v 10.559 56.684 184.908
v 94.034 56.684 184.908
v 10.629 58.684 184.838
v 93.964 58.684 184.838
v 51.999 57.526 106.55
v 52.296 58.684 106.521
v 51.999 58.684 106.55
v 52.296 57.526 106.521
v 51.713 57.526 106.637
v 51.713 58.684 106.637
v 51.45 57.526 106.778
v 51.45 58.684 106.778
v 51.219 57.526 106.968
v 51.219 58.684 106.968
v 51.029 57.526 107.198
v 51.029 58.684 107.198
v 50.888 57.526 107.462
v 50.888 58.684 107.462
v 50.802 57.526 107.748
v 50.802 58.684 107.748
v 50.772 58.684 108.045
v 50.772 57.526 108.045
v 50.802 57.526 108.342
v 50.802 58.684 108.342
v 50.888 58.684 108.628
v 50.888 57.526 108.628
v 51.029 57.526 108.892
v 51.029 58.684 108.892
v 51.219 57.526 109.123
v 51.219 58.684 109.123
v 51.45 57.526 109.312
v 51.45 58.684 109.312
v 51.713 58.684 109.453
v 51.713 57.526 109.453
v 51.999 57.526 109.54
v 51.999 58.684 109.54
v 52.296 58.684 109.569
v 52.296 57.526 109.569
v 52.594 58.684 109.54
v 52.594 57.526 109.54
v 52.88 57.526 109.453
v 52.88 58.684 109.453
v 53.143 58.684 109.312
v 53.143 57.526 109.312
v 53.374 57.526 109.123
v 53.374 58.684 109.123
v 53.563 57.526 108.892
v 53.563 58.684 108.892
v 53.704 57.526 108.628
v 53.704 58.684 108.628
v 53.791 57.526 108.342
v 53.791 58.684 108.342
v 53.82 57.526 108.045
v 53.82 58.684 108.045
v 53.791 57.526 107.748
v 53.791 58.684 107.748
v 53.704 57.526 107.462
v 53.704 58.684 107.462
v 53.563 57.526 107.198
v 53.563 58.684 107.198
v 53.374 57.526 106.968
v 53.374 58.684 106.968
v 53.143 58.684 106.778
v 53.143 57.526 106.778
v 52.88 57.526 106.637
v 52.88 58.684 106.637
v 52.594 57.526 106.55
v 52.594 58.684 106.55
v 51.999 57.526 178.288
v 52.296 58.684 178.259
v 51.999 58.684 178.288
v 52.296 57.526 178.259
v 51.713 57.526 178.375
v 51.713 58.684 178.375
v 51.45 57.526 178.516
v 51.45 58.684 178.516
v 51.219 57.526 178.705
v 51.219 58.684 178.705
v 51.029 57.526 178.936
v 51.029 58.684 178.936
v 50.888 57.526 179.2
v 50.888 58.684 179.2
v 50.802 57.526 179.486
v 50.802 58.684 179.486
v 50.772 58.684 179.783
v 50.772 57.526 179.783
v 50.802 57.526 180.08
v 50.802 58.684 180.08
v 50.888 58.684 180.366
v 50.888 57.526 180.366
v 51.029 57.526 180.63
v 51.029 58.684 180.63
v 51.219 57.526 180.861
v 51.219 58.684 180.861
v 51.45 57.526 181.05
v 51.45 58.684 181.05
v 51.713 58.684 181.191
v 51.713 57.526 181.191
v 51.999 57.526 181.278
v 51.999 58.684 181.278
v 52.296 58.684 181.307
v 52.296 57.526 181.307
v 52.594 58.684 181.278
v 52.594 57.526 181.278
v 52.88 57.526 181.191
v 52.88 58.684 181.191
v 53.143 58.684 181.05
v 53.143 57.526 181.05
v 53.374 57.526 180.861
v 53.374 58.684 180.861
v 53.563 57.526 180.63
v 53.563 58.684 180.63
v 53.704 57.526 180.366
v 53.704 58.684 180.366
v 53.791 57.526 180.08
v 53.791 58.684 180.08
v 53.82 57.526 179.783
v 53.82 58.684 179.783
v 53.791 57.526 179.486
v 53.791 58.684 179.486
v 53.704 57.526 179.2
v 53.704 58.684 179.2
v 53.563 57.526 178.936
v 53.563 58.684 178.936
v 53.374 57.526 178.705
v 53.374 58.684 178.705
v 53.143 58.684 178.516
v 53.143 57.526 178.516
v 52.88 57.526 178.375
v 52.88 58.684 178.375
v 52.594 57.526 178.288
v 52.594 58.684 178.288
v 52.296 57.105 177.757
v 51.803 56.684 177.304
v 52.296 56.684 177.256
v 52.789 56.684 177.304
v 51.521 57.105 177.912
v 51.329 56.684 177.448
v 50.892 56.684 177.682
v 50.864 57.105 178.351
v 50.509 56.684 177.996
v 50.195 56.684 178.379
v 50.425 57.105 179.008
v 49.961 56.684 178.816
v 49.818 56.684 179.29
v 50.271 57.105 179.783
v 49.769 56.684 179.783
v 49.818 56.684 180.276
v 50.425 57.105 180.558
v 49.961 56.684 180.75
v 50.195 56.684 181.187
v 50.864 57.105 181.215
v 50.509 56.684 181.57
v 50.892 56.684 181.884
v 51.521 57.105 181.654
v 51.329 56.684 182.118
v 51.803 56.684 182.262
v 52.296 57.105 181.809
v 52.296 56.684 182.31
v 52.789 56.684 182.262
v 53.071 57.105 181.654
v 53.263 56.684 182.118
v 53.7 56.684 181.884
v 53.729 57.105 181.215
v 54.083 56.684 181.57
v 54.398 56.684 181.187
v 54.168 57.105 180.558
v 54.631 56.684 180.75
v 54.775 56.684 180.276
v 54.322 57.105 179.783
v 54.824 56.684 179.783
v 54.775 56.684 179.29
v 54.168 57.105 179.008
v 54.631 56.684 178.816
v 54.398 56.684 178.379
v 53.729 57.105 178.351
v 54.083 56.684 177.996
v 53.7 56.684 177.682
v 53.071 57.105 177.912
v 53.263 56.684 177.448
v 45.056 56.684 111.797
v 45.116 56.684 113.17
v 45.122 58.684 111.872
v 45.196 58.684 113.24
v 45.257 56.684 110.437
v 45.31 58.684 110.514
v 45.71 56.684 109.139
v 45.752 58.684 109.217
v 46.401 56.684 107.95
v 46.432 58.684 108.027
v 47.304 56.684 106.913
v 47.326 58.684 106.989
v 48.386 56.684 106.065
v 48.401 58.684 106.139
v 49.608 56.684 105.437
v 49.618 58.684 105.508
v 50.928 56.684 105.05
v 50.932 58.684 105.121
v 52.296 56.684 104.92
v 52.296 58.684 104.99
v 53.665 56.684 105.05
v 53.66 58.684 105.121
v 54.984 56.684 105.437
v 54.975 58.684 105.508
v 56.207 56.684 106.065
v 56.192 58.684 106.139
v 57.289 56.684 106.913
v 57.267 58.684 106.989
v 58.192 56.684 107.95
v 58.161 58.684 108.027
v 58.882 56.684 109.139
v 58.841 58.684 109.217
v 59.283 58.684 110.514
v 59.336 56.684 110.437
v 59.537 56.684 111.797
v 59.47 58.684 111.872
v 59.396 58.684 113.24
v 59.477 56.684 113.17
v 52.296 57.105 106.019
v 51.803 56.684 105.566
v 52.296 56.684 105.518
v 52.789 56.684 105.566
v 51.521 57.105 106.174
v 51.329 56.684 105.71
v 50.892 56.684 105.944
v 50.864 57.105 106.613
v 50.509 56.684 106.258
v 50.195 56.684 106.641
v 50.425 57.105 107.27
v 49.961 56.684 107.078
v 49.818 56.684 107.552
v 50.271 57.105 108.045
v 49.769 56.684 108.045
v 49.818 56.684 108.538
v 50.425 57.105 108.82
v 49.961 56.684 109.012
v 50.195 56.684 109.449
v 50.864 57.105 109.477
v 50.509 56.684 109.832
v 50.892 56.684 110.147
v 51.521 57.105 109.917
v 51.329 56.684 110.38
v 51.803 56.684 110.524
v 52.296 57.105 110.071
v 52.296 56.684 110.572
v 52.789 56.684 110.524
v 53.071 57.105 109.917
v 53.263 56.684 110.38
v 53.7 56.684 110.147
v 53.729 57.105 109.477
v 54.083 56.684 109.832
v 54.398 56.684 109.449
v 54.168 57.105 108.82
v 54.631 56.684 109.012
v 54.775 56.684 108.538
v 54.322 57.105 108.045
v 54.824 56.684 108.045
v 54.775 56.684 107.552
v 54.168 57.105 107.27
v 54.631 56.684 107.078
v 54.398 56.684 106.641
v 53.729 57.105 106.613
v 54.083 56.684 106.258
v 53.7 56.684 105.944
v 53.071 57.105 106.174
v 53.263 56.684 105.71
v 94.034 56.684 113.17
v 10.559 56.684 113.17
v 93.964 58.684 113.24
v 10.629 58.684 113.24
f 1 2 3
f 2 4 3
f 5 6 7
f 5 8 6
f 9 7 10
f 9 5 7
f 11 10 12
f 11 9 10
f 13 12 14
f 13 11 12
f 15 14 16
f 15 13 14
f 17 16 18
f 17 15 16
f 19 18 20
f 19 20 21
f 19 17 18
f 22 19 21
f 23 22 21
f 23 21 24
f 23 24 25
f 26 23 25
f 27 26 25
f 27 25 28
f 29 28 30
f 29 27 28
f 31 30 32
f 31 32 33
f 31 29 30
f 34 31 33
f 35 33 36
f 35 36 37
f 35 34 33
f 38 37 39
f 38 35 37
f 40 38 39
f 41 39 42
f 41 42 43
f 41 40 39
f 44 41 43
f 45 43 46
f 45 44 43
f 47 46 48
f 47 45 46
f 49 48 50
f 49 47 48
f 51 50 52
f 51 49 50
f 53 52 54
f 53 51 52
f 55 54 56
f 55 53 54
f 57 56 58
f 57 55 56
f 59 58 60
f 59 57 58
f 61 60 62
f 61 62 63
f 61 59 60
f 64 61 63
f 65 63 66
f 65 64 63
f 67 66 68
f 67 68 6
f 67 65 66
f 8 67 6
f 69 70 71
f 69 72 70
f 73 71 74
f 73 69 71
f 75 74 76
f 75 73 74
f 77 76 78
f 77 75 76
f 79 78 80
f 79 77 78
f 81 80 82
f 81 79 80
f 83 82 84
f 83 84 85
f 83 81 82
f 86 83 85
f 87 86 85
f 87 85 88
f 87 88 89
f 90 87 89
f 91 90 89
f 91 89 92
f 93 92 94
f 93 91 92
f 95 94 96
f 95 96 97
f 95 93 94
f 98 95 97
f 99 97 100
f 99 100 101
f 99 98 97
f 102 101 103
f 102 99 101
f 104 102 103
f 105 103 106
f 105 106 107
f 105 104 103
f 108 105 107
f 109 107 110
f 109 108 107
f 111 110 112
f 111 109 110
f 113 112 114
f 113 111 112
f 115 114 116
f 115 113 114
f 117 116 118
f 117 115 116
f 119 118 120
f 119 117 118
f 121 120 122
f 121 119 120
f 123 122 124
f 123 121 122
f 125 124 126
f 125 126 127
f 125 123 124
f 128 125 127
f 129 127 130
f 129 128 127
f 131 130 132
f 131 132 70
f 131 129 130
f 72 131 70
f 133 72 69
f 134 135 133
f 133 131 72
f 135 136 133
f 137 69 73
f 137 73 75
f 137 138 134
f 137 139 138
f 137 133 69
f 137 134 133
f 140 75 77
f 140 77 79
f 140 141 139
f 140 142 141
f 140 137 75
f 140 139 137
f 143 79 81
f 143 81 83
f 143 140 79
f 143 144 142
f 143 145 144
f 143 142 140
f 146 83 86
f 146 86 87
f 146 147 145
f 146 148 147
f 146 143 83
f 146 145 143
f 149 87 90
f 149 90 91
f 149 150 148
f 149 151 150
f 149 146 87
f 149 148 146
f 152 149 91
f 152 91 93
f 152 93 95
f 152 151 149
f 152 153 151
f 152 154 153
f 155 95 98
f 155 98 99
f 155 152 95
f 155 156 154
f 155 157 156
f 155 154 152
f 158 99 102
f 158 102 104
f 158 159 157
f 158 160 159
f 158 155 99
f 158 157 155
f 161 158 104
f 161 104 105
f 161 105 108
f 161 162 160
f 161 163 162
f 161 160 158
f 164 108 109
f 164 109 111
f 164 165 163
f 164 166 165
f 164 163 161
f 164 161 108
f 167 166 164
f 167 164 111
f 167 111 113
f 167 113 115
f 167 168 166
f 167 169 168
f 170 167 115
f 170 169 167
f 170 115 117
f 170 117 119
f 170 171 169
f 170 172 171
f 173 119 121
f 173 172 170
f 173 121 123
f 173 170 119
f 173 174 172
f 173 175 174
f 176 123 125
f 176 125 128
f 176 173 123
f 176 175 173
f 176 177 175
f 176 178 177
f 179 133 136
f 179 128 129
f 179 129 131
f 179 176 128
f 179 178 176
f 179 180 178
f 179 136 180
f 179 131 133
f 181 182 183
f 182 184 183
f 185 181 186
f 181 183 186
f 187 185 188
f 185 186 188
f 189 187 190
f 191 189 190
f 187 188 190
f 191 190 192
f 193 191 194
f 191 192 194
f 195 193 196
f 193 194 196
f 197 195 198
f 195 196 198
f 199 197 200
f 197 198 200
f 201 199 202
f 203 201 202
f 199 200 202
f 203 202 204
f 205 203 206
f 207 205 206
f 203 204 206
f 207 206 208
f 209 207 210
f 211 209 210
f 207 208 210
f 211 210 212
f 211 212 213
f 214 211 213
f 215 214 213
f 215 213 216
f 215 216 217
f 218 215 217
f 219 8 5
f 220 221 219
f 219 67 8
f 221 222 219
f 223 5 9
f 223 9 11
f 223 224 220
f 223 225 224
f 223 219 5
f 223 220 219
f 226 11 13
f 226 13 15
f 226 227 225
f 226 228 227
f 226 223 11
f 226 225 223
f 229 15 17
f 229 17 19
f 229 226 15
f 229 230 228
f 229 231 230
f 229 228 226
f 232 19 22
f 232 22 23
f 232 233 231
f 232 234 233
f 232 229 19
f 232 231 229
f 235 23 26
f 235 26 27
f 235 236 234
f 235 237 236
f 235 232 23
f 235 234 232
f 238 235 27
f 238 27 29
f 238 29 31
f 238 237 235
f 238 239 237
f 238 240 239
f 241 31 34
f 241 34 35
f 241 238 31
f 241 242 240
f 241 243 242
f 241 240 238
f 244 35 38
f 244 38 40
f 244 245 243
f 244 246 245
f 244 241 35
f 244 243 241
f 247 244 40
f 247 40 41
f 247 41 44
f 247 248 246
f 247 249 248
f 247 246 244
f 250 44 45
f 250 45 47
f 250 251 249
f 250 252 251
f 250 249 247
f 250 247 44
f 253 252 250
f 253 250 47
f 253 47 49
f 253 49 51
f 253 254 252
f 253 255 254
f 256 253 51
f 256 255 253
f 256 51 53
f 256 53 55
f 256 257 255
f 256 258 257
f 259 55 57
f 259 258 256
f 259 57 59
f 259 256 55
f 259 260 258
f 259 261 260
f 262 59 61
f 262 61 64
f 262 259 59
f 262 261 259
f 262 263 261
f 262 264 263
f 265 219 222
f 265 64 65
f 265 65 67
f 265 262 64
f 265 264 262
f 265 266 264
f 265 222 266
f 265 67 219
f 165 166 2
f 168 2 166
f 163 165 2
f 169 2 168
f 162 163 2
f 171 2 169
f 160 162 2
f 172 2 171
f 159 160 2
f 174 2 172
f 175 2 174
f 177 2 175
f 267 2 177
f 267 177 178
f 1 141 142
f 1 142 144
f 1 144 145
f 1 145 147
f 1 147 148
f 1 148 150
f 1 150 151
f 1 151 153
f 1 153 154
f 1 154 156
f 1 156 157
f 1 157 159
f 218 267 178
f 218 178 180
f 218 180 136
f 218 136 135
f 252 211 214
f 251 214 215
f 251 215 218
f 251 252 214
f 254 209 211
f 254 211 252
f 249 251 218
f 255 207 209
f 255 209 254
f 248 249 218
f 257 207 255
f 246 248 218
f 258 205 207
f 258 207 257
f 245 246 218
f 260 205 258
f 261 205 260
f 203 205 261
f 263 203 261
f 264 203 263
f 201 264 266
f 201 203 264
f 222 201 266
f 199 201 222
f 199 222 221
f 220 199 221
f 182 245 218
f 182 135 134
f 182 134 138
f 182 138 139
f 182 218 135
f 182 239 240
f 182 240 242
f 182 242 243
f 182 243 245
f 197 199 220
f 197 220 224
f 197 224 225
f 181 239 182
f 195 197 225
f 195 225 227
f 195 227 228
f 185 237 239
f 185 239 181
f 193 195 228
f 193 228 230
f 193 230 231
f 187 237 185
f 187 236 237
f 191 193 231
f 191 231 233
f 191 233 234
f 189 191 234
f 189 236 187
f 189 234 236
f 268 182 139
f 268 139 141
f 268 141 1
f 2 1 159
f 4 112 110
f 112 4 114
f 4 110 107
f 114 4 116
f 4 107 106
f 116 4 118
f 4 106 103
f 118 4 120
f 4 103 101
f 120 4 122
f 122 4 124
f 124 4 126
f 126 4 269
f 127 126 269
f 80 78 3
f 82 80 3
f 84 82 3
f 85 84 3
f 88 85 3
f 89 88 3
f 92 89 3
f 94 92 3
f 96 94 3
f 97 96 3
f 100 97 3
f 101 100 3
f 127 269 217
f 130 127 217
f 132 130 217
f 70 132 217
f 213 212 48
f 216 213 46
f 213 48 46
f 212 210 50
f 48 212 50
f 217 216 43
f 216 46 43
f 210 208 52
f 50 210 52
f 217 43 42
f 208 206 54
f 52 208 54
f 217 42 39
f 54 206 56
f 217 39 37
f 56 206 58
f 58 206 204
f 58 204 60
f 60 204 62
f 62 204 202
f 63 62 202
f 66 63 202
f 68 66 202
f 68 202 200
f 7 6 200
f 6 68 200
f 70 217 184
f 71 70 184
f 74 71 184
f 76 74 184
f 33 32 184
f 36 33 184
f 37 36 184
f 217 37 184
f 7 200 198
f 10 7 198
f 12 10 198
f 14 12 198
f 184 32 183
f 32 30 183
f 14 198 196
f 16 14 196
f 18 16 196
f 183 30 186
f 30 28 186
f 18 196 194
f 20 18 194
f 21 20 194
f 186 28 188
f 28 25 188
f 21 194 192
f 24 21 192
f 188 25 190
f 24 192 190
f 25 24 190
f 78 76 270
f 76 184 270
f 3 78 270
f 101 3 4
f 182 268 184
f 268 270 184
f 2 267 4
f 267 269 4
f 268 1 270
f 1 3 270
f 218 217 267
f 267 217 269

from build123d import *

# Parameters (mm, degrees)
BOSS_EXTRUDE1_DEPTH                       = 2
BOSS_EXTRUDE1_TAPER                       = 2
CSK_FOR_3_FLAT_HEAD_MACHINE_SCREW_2_COUNT = 2
CSK_FOR_3_FLAT_HEAD_MACHINE_SCREW_2_PITCH = 71.73786937


with BuildPart() as part:
    # Sketch1 → Boss-Extrude1 (new body)
    with BuildSketch(Plane(origin=(0, 56.683920775, 0), x_dir=(-1, 0, 0), z_dir=(0, -1, 0))):
        with BuildLine():
            ThreePointArc((-45.115607871, -113.170136337), (-52.296311179, -104.920136337), (-59.477014487, -113.170136337))
            Line((-59.477014487, -113.170136337), (-94.033723565, -113.170136337))
            Line((-94.033723565, -113.170136337), (-94.033723565, -184.908005707))
            Line((-94.033723565, -184.908005707), (-10.558898793, -184.908005707))
            Line((-10.558898793, -184.908005707), (-10.558898793, -113.170136337))
            Line((-10.558898793, -113.170136337), (-45.115607871, -113.170136337))
        make_face()
    extrude(amount=-BOSS_EXTRUDE1_DEPTH, taper=BOSS_EXTRUDE1_TAPER)

    # Sketch3 → CSK for #3 Flat Head Machine Screw (100)1 (revolve, cut)
    with BuildSketch(Plane(origin=(52.296311179, 56.683920775, 108.045136337), x_dir=(0, 0, -1), z_dir=(1, 0, 0))):
        Polygon((0, 0), (0, 2), (1.524, 2), (1.524, 0.84186866), (2.5273, 0), align=None)
    csk_for_3_flat_head_machine_screw_100 = revolve(axis=Axis((52.296311179, 50.333920775, 108.045136337), (0, 1, 0)), mode=Mode.SUBTRACT)

    # CSK for _3 Flat Head Machine Screw _ 2: CSK for #3 Flat Head Machine Screw (100)1 ×2
    with Locations(*[(0, 0, i * CSK_FOR_3_FLAT_HEAD_MACHINE_SCREW_2_PITCH) for i in range(1, CSK_FOR_3_FLAT_HEAD_MACHINE_SCREW_2_COUNT)]):
        add(csk_for_3_flat_head_machine_screw_100, mode=Mode.SUBTRACT)


solid = part.part
